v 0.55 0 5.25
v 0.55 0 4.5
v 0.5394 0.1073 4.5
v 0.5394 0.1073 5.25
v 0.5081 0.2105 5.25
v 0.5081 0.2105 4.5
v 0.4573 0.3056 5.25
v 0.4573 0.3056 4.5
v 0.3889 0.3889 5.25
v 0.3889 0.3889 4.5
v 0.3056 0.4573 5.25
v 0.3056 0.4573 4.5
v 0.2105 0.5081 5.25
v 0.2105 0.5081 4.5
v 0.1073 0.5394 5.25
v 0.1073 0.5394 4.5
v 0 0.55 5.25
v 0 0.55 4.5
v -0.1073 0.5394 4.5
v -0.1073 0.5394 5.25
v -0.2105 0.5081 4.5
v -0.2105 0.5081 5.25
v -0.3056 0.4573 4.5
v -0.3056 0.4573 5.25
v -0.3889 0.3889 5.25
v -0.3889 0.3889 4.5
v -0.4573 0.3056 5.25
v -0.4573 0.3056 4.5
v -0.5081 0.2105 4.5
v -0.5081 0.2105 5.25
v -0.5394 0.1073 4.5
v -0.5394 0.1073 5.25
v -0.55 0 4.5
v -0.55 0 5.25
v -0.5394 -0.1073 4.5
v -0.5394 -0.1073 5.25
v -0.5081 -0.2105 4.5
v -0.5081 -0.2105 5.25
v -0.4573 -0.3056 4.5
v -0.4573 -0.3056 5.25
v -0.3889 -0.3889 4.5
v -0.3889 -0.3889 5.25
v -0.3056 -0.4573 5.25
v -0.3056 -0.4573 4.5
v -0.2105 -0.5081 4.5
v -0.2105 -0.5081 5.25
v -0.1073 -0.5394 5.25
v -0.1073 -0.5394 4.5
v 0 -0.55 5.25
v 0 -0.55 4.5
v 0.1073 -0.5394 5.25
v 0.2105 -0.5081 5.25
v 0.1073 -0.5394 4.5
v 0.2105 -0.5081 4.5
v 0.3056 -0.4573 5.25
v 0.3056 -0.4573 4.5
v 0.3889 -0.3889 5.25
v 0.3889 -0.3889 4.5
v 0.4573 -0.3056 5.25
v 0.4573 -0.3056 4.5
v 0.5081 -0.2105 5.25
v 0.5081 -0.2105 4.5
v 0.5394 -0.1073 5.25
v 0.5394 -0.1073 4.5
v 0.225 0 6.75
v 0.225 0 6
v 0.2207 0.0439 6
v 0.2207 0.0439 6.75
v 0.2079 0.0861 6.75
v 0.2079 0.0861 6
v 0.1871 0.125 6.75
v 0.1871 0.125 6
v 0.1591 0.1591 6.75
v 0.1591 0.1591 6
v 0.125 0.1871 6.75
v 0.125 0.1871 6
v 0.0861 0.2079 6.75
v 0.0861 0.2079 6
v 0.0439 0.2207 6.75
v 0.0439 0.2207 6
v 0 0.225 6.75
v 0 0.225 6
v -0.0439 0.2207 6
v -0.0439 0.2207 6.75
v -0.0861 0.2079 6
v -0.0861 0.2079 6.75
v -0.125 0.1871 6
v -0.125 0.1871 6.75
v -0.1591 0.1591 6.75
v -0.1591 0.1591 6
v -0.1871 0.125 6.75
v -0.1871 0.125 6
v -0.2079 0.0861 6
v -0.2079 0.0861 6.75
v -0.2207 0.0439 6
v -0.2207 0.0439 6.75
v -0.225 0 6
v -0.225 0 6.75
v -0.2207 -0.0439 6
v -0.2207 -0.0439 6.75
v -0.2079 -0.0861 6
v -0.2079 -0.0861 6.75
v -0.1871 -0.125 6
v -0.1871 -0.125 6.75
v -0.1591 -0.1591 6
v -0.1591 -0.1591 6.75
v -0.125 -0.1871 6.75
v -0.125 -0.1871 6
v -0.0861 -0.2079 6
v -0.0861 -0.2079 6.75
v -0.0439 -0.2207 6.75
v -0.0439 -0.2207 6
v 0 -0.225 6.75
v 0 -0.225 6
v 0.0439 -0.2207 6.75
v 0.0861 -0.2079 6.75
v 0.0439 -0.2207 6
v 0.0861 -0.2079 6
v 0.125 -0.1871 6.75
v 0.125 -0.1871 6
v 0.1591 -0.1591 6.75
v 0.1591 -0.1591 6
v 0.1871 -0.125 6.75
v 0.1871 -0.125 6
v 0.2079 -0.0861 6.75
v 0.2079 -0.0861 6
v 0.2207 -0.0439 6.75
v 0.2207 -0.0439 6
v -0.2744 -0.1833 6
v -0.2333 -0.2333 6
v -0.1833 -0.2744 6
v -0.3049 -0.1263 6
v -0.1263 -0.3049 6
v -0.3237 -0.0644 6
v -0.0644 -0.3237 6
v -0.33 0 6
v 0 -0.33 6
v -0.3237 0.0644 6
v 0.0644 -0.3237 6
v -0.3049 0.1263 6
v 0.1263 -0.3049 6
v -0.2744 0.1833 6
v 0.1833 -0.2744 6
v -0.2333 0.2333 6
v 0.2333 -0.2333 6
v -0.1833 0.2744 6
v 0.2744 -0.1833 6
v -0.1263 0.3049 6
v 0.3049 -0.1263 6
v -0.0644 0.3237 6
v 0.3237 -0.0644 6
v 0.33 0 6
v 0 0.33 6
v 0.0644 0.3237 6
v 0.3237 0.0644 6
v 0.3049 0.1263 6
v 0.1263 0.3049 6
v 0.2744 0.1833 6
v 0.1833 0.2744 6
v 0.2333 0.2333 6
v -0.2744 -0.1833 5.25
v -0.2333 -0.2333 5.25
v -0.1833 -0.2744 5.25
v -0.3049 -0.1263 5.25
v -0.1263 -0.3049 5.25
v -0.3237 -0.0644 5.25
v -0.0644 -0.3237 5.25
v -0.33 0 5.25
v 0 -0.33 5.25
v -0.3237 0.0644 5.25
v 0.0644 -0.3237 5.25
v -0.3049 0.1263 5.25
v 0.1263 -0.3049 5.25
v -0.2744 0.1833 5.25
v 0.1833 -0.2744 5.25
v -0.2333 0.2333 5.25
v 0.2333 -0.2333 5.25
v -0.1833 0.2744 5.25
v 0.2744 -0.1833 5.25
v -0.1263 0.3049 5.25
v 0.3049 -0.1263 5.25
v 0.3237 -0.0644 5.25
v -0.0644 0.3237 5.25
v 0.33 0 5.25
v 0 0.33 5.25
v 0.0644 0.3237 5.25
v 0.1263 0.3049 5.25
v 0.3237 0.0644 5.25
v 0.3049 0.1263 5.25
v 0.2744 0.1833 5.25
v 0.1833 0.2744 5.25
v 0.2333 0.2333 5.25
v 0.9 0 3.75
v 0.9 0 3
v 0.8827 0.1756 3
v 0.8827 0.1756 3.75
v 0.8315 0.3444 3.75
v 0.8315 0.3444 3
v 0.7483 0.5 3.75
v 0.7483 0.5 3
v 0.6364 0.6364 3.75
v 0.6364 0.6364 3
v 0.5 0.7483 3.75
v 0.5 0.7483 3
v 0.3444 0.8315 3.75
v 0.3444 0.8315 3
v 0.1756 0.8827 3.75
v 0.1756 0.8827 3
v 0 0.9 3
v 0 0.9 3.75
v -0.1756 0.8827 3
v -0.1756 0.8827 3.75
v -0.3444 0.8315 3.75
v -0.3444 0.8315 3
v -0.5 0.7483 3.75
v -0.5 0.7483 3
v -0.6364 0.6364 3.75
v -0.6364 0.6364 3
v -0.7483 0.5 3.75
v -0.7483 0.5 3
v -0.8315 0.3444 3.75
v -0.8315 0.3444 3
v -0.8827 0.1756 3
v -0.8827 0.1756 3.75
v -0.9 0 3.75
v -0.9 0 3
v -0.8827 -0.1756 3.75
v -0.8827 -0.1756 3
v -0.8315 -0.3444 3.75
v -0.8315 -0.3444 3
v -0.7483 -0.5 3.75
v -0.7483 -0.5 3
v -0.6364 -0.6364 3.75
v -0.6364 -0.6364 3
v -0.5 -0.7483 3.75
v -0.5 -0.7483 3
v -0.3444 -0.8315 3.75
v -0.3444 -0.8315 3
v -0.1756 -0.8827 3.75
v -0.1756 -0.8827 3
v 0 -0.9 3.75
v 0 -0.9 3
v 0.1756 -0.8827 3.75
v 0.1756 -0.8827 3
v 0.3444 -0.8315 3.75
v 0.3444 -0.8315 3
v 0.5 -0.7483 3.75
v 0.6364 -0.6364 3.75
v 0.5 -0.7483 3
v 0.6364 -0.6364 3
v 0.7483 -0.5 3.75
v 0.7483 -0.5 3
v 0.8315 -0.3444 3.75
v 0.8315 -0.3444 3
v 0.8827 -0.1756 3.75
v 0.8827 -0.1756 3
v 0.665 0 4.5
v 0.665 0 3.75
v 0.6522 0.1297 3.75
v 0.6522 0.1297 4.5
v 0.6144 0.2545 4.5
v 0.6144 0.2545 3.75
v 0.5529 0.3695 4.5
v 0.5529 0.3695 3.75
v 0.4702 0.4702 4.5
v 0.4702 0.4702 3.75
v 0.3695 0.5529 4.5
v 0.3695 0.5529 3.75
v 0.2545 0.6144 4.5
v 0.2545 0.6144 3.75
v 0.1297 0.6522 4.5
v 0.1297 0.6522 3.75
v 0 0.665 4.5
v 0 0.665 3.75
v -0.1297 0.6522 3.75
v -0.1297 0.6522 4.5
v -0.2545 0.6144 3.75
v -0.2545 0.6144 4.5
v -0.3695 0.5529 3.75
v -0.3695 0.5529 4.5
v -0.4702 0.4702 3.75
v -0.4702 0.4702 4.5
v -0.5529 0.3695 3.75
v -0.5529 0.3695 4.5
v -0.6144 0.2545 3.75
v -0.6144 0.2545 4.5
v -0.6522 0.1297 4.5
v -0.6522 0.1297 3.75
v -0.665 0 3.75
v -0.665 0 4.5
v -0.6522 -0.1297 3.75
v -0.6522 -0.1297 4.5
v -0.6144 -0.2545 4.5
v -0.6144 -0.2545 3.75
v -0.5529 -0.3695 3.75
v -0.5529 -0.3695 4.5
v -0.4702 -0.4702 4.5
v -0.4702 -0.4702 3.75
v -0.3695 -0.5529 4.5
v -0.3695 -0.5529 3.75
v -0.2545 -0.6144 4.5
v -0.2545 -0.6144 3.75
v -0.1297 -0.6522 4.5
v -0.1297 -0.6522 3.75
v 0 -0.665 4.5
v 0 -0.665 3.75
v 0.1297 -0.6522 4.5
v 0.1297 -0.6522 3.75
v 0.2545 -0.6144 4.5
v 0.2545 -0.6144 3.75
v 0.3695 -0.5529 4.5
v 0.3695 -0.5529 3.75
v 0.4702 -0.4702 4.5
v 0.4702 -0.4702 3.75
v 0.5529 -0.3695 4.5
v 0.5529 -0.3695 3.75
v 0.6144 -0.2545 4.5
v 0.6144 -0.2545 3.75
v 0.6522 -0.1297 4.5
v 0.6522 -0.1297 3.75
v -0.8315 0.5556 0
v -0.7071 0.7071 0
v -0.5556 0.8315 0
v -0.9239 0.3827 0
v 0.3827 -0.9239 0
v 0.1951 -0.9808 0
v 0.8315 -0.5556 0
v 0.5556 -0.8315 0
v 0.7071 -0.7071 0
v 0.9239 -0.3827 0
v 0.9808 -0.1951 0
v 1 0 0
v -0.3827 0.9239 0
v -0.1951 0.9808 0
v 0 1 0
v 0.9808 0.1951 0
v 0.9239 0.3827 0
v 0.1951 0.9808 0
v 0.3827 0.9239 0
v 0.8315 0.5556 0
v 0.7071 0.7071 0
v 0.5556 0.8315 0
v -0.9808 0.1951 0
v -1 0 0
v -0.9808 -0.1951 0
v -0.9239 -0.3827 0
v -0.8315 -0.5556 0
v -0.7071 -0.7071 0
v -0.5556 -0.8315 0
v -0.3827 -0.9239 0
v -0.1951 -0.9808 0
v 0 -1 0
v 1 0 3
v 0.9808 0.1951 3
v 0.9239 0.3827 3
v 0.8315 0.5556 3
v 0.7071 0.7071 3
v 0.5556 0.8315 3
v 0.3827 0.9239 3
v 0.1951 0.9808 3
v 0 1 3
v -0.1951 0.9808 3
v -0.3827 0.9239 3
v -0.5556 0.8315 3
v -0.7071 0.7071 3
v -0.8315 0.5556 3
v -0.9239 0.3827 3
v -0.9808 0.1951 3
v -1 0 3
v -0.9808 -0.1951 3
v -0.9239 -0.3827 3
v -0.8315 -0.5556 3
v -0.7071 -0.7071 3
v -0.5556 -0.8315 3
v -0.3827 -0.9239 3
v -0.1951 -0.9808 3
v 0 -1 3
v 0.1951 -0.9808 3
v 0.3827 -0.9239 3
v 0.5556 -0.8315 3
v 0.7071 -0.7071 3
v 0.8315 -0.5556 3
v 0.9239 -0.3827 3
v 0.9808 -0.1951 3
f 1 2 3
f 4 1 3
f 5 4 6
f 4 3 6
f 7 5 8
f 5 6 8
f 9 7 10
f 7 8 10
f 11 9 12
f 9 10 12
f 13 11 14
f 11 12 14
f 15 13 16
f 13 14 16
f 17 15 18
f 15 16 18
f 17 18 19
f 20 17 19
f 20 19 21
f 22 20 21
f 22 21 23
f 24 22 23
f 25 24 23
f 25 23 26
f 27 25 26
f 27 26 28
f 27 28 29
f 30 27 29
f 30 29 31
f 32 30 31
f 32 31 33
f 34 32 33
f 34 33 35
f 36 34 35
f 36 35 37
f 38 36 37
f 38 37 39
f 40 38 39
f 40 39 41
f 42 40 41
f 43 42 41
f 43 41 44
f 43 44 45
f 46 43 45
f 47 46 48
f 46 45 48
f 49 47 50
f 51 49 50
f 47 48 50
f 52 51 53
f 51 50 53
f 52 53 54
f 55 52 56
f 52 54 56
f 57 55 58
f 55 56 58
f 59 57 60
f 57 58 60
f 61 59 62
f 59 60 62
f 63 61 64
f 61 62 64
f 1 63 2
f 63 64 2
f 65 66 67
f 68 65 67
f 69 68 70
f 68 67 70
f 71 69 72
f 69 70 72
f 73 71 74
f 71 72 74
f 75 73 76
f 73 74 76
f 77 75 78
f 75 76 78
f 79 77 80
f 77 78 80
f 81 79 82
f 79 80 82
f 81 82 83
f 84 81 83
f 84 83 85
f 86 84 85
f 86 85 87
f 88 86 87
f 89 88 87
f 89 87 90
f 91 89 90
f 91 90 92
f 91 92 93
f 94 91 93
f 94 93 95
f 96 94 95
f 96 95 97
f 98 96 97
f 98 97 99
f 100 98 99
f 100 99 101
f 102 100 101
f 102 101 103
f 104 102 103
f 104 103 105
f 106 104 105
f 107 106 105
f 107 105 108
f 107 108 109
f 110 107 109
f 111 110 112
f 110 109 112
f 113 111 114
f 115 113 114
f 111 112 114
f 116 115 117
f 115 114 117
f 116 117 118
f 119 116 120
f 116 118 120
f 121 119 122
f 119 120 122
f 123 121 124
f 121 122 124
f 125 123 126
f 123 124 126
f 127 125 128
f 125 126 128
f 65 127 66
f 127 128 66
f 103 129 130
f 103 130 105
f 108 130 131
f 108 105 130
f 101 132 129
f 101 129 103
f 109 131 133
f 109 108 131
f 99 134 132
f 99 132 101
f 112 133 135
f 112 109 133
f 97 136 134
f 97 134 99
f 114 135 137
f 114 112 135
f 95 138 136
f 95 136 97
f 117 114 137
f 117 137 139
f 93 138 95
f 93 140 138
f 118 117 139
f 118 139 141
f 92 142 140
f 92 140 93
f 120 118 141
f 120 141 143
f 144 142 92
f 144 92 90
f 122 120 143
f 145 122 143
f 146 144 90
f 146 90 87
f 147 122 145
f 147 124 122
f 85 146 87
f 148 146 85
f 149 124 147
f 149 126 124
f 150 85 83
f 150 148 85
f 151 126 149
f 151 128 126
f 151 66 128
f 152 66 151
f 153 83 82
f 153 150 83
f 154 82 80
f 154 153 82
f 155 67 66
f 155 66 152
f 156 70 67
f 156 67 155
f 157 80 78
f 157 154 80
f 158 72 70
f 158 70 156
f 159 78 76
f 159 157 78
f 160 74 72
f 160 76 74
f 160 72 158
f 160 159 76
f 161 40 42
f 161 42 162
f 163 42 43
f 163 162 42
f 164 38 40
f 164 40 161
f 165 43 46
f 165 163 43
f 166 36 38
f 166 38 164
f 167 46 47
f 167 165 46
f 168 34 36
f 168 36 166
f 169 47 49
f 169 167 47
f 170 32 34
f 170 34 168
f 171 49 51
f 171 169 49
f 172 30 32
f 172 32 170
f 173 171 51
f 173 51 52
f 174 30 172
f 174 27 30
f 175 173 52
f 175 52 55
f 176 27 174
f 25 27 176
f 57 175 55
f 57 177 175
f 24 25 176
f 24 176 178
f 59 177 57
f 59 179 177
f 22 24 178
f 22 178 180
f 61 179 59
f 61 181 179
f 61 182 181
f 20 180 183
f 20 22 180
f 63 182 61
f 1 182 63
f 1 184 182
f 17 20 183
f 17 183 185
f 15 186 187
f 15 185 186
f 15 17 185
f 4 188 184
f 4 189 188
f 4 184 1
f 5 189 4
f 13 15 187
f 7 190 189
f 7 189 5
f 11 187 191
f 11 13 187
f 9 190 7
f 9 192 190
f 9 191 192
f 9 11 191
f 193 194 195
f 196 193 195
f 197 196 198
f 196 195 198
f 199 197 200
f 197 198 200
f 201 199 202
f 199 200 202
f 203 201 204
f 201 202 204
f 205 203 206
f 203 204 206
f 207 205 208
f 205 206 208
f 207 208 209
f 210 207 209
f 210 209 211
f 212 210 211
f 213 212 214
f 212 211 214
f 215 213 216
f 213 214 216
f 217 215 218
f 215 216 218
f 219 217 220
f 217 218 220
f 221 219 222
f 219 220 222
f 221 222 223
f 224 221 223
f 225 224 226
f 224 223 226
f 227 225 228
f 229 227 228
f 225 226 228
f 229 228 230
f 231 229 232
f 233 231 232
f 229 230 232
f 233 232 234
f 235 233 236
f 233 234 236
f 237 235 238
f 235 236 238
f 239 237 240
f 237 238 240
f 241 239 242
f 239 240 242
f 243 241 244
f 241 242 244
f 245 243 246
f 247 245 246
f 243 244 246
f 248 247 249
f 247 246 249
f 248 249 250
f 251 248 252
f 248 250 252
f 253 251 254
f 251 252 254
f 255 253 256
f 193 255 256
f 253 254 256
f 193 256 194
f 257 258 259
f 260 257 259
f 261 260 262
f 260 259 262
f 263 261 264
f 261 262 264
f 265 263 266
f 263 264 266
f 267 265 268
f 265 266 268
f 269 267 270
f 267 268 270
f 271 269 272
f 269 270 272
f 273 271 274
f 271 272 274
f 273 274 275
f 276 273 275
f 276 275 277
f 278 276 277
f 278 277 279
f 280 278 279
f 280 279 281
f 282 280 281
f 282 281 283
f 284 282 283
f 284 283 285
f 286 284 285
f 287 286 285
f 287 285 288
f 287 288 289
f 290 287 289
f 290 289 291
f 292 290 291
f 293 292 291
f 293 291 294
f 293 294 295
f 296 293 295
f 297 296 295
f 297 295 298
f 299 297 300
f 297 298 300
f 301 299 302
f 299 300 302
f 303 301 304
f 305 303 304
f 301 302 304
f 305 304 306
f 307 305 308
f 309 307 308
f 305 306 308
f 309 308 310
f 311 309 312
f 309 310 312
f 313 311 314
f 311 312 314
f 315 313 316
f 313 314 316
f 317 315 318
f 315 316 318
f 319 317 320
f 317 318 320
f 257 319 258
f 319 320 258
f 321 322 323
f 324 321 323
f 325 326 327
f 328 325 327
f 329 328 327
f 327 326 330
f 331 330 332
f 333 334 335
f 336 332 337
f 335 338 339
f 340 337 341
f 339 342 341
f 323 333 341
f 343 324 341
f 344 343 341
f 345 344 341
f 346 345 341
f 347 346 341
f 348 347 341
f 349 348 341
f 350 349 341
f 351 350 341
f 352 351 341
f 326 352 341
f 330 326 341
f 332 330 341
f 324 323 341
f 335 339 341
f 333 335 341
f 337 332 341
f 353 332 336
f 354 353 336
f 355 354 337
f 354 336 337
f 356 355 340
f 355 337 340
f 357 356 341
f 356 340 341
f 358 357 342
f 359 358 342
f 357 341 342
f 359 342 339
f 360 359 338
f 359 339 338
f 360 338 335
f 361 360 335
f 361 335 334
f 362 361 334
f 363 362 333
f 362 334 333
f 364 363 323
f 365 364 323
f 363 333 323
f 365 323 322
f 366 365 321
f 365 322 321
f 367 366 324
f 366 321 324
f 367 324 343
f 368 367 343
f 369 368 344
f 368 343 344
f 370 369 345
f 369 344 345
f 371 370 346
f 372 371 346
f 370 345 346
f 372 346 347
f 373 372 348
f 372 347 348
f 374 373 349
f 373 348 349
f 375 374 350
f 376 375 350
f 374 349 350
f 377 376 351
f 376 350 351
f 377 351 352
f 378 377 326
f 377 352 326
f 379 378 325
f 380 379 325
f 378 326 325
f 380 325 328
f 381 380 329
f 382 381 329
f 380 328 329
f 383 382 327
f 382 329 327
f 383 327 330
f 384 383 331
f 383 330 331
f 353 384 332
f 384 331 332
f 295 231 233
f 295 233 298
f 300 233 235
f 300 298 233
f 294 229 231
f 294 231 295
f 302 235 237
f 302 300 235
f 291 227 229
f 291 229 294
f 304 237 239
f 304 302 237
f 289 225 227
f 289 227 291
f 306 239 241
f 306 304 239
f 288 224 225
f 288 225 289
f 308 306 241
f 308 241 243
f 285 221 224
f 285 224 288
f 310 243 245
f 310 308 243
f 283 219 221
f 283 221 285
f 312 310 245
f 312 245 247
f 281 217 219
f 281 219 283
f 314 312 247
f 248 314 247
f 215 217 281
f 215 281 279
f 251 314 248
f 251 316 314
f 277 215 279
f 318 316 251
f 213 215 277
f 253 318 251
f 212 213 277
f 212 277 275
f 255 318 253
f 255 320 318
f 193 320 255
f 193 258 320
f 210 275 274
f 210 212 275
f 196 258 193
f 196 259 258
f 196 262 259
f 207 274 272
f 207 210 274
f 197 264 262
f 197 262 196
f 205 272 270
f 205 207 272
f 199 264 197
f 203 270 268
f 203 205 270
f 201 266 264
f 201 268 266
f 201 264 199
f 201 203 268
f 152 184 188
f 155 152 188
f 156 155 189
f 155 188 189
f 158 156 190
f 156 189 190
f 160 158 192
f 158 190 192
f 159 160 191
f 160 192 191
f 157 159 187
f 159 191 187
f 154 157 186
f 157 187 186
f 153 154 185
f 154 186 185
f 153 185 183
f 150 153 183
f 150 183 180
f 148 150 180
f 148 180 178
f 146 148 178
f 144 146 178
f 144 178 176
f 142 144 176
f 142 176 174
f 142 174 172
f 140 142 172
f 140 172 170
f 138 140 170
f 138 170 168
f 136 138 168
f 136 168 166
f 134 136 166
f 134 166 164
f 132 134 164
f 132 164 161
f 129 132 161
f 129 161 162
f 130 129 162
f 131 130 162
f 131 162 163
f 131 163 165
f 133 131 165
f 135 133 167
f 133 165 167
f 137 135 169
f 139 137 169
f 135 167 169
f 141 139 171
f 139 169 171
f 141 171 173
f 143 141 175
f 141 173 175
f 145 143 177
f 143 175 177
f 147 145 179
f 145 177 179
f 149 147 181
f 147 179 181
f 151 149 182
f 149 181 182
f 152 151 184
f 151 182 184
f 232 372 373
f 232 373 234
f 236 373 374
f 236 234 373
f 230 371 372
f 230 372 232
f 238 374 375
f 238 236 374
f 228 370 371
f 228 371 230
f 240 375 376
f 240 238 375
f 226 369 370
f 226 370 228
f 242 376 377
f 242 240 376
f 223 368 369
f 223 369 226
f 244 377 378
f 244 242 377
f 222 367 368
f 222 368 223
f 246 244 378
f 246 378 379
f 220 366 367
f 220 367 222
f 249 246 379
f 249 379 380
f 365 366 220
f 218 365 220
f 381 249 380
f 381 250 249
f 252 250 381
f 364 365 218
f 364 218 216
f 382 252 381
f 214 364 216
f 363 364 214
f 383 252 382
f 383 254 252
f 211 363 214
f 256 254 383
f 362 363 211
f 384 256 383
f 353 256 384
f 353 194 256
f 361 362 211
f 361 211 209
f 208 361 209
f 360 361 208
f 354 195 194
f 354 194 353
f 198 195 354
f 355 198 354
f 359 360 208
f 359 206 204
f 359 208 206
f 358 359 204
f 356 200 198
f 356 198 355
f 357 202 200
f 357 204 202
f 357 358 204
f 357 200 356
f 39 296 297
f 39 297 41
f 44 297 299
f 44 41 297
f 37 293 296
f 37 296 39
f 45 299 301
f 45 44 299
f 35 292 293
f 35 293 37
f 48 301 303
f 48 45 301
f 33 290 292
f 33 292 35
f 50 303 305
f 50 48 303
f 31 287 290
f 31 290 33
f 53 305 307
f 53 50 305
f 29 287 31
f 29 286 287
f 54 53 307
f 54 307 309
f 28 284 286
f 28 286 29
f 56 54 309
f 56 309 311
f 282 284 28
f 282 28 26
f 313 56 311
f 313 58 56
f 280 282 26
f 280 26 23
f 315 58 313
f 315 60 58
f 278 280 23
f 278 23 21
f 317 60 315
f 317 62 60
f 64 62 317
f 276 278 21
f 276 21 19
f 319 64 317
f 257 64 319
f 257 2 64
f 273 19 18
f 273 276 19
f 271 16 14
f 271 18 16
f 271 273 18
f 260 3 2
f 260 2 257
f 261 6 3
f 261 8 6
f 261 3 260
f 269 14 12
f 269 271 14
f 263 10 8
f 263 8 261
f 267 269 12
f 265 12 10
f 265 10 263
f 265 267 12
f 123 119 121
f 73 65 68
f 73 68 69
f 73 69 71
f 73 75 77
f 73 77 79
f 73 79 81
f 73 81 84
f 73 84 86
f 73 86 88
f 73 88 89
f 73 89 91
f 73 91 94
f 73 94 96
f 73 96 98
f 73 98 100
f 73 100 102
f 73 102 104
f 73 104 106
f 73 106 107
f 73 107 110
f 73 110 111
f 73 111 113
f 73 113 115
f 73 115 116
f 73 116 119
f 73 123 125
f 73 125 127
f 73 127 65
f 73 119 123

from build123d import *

# Parameters (mm, degrees)
SKETCH1_R           = 1
BOSS_EXTRUDE1_DEPTH = 3
SKETCH2_R           = 0.33
SKETCH2_R_2         = 0.225
BOSS_EXTRUDE2_DEPTH = 3
SKETCH2_3_R         = 0.55
SKETCH2_3_R_2       = 0.33
BOSS_EXTRUDE3_DEPTH = 2.25
SKETCH2_4_R         = 0.665
SKETCH2_4_R_2       = 0.55
BOSS_EXTRUDE4_DEPTH = 1.5
SKETCH2_6_R         = 0.9
SKETCH2_6_R_2       = 0.665
BOSS_EXTRUDE6_DEPTH = 0.75
SKETCH2_7_R         = 0.225
BOSS_EXTRUDE7_DEPTH = 3.75


with BuildPart() as part:
    # Sketch1 → Boss-Extrude1 (new body)
    with BuildSketch(Plane.XY):
        Circle(SKETCH1_R)
    extrude(amount=BOSS_EXTRUDE1_DEPTH)

    # Sketch2 → Boss-Extrude2 (add)
    with BuildSketch(Plane.XY.offset(3)):
        Circle(SKETCH2_R)
        Circle(SKETCH2_R_2, mode=Mode.SUBTRACT)
    extrude(amount=BOSS_EXTRUDE2_DEPTH)

    # Sketch2<3> → Boss-Extrude3 (add)
    with BuildSketch(Plane.XY.offset(3)):
        Circle(SKETCH2_3_R)
        Circle(SKETCH2_3_R_2, mode=Mode.SUBTRACT)
    extrude(amount=BOSS_EXTRUDE3_DEPTH)

    # Sketch2<4> → Boss-Extrude4 (add)
    with BuildSketch(Plane.XY.offset(3)):
        Circle(SKETCH2_4_R)
        Circle(SKETCH2_4_R_2, mode=Mode.SUBTRACT)
    extrude(amount=BOSS_EXTRUDE4_DEPTH)

    # Sketch2<6> → Boss-Extrude6 (add)
    with BuildSketch(Plane.XY.offset(3)):
        Circle(SKETCH2_6_R)
        Circle(SKETCH2_6_R_2, mode=Mode.SUBTRACT)
    extrude(amount=BOSS_EXTRUDE6_DEPTH)

    # Sketch2<7> → Boss-Extrude7 (add)
    with BuildSketch(Plane.XY.offset(3)):
        Circle(SKETCH2_7_R)
    extrude(amount=BOSS_EXTRUDE7_DEPTH)


solid = part.part
